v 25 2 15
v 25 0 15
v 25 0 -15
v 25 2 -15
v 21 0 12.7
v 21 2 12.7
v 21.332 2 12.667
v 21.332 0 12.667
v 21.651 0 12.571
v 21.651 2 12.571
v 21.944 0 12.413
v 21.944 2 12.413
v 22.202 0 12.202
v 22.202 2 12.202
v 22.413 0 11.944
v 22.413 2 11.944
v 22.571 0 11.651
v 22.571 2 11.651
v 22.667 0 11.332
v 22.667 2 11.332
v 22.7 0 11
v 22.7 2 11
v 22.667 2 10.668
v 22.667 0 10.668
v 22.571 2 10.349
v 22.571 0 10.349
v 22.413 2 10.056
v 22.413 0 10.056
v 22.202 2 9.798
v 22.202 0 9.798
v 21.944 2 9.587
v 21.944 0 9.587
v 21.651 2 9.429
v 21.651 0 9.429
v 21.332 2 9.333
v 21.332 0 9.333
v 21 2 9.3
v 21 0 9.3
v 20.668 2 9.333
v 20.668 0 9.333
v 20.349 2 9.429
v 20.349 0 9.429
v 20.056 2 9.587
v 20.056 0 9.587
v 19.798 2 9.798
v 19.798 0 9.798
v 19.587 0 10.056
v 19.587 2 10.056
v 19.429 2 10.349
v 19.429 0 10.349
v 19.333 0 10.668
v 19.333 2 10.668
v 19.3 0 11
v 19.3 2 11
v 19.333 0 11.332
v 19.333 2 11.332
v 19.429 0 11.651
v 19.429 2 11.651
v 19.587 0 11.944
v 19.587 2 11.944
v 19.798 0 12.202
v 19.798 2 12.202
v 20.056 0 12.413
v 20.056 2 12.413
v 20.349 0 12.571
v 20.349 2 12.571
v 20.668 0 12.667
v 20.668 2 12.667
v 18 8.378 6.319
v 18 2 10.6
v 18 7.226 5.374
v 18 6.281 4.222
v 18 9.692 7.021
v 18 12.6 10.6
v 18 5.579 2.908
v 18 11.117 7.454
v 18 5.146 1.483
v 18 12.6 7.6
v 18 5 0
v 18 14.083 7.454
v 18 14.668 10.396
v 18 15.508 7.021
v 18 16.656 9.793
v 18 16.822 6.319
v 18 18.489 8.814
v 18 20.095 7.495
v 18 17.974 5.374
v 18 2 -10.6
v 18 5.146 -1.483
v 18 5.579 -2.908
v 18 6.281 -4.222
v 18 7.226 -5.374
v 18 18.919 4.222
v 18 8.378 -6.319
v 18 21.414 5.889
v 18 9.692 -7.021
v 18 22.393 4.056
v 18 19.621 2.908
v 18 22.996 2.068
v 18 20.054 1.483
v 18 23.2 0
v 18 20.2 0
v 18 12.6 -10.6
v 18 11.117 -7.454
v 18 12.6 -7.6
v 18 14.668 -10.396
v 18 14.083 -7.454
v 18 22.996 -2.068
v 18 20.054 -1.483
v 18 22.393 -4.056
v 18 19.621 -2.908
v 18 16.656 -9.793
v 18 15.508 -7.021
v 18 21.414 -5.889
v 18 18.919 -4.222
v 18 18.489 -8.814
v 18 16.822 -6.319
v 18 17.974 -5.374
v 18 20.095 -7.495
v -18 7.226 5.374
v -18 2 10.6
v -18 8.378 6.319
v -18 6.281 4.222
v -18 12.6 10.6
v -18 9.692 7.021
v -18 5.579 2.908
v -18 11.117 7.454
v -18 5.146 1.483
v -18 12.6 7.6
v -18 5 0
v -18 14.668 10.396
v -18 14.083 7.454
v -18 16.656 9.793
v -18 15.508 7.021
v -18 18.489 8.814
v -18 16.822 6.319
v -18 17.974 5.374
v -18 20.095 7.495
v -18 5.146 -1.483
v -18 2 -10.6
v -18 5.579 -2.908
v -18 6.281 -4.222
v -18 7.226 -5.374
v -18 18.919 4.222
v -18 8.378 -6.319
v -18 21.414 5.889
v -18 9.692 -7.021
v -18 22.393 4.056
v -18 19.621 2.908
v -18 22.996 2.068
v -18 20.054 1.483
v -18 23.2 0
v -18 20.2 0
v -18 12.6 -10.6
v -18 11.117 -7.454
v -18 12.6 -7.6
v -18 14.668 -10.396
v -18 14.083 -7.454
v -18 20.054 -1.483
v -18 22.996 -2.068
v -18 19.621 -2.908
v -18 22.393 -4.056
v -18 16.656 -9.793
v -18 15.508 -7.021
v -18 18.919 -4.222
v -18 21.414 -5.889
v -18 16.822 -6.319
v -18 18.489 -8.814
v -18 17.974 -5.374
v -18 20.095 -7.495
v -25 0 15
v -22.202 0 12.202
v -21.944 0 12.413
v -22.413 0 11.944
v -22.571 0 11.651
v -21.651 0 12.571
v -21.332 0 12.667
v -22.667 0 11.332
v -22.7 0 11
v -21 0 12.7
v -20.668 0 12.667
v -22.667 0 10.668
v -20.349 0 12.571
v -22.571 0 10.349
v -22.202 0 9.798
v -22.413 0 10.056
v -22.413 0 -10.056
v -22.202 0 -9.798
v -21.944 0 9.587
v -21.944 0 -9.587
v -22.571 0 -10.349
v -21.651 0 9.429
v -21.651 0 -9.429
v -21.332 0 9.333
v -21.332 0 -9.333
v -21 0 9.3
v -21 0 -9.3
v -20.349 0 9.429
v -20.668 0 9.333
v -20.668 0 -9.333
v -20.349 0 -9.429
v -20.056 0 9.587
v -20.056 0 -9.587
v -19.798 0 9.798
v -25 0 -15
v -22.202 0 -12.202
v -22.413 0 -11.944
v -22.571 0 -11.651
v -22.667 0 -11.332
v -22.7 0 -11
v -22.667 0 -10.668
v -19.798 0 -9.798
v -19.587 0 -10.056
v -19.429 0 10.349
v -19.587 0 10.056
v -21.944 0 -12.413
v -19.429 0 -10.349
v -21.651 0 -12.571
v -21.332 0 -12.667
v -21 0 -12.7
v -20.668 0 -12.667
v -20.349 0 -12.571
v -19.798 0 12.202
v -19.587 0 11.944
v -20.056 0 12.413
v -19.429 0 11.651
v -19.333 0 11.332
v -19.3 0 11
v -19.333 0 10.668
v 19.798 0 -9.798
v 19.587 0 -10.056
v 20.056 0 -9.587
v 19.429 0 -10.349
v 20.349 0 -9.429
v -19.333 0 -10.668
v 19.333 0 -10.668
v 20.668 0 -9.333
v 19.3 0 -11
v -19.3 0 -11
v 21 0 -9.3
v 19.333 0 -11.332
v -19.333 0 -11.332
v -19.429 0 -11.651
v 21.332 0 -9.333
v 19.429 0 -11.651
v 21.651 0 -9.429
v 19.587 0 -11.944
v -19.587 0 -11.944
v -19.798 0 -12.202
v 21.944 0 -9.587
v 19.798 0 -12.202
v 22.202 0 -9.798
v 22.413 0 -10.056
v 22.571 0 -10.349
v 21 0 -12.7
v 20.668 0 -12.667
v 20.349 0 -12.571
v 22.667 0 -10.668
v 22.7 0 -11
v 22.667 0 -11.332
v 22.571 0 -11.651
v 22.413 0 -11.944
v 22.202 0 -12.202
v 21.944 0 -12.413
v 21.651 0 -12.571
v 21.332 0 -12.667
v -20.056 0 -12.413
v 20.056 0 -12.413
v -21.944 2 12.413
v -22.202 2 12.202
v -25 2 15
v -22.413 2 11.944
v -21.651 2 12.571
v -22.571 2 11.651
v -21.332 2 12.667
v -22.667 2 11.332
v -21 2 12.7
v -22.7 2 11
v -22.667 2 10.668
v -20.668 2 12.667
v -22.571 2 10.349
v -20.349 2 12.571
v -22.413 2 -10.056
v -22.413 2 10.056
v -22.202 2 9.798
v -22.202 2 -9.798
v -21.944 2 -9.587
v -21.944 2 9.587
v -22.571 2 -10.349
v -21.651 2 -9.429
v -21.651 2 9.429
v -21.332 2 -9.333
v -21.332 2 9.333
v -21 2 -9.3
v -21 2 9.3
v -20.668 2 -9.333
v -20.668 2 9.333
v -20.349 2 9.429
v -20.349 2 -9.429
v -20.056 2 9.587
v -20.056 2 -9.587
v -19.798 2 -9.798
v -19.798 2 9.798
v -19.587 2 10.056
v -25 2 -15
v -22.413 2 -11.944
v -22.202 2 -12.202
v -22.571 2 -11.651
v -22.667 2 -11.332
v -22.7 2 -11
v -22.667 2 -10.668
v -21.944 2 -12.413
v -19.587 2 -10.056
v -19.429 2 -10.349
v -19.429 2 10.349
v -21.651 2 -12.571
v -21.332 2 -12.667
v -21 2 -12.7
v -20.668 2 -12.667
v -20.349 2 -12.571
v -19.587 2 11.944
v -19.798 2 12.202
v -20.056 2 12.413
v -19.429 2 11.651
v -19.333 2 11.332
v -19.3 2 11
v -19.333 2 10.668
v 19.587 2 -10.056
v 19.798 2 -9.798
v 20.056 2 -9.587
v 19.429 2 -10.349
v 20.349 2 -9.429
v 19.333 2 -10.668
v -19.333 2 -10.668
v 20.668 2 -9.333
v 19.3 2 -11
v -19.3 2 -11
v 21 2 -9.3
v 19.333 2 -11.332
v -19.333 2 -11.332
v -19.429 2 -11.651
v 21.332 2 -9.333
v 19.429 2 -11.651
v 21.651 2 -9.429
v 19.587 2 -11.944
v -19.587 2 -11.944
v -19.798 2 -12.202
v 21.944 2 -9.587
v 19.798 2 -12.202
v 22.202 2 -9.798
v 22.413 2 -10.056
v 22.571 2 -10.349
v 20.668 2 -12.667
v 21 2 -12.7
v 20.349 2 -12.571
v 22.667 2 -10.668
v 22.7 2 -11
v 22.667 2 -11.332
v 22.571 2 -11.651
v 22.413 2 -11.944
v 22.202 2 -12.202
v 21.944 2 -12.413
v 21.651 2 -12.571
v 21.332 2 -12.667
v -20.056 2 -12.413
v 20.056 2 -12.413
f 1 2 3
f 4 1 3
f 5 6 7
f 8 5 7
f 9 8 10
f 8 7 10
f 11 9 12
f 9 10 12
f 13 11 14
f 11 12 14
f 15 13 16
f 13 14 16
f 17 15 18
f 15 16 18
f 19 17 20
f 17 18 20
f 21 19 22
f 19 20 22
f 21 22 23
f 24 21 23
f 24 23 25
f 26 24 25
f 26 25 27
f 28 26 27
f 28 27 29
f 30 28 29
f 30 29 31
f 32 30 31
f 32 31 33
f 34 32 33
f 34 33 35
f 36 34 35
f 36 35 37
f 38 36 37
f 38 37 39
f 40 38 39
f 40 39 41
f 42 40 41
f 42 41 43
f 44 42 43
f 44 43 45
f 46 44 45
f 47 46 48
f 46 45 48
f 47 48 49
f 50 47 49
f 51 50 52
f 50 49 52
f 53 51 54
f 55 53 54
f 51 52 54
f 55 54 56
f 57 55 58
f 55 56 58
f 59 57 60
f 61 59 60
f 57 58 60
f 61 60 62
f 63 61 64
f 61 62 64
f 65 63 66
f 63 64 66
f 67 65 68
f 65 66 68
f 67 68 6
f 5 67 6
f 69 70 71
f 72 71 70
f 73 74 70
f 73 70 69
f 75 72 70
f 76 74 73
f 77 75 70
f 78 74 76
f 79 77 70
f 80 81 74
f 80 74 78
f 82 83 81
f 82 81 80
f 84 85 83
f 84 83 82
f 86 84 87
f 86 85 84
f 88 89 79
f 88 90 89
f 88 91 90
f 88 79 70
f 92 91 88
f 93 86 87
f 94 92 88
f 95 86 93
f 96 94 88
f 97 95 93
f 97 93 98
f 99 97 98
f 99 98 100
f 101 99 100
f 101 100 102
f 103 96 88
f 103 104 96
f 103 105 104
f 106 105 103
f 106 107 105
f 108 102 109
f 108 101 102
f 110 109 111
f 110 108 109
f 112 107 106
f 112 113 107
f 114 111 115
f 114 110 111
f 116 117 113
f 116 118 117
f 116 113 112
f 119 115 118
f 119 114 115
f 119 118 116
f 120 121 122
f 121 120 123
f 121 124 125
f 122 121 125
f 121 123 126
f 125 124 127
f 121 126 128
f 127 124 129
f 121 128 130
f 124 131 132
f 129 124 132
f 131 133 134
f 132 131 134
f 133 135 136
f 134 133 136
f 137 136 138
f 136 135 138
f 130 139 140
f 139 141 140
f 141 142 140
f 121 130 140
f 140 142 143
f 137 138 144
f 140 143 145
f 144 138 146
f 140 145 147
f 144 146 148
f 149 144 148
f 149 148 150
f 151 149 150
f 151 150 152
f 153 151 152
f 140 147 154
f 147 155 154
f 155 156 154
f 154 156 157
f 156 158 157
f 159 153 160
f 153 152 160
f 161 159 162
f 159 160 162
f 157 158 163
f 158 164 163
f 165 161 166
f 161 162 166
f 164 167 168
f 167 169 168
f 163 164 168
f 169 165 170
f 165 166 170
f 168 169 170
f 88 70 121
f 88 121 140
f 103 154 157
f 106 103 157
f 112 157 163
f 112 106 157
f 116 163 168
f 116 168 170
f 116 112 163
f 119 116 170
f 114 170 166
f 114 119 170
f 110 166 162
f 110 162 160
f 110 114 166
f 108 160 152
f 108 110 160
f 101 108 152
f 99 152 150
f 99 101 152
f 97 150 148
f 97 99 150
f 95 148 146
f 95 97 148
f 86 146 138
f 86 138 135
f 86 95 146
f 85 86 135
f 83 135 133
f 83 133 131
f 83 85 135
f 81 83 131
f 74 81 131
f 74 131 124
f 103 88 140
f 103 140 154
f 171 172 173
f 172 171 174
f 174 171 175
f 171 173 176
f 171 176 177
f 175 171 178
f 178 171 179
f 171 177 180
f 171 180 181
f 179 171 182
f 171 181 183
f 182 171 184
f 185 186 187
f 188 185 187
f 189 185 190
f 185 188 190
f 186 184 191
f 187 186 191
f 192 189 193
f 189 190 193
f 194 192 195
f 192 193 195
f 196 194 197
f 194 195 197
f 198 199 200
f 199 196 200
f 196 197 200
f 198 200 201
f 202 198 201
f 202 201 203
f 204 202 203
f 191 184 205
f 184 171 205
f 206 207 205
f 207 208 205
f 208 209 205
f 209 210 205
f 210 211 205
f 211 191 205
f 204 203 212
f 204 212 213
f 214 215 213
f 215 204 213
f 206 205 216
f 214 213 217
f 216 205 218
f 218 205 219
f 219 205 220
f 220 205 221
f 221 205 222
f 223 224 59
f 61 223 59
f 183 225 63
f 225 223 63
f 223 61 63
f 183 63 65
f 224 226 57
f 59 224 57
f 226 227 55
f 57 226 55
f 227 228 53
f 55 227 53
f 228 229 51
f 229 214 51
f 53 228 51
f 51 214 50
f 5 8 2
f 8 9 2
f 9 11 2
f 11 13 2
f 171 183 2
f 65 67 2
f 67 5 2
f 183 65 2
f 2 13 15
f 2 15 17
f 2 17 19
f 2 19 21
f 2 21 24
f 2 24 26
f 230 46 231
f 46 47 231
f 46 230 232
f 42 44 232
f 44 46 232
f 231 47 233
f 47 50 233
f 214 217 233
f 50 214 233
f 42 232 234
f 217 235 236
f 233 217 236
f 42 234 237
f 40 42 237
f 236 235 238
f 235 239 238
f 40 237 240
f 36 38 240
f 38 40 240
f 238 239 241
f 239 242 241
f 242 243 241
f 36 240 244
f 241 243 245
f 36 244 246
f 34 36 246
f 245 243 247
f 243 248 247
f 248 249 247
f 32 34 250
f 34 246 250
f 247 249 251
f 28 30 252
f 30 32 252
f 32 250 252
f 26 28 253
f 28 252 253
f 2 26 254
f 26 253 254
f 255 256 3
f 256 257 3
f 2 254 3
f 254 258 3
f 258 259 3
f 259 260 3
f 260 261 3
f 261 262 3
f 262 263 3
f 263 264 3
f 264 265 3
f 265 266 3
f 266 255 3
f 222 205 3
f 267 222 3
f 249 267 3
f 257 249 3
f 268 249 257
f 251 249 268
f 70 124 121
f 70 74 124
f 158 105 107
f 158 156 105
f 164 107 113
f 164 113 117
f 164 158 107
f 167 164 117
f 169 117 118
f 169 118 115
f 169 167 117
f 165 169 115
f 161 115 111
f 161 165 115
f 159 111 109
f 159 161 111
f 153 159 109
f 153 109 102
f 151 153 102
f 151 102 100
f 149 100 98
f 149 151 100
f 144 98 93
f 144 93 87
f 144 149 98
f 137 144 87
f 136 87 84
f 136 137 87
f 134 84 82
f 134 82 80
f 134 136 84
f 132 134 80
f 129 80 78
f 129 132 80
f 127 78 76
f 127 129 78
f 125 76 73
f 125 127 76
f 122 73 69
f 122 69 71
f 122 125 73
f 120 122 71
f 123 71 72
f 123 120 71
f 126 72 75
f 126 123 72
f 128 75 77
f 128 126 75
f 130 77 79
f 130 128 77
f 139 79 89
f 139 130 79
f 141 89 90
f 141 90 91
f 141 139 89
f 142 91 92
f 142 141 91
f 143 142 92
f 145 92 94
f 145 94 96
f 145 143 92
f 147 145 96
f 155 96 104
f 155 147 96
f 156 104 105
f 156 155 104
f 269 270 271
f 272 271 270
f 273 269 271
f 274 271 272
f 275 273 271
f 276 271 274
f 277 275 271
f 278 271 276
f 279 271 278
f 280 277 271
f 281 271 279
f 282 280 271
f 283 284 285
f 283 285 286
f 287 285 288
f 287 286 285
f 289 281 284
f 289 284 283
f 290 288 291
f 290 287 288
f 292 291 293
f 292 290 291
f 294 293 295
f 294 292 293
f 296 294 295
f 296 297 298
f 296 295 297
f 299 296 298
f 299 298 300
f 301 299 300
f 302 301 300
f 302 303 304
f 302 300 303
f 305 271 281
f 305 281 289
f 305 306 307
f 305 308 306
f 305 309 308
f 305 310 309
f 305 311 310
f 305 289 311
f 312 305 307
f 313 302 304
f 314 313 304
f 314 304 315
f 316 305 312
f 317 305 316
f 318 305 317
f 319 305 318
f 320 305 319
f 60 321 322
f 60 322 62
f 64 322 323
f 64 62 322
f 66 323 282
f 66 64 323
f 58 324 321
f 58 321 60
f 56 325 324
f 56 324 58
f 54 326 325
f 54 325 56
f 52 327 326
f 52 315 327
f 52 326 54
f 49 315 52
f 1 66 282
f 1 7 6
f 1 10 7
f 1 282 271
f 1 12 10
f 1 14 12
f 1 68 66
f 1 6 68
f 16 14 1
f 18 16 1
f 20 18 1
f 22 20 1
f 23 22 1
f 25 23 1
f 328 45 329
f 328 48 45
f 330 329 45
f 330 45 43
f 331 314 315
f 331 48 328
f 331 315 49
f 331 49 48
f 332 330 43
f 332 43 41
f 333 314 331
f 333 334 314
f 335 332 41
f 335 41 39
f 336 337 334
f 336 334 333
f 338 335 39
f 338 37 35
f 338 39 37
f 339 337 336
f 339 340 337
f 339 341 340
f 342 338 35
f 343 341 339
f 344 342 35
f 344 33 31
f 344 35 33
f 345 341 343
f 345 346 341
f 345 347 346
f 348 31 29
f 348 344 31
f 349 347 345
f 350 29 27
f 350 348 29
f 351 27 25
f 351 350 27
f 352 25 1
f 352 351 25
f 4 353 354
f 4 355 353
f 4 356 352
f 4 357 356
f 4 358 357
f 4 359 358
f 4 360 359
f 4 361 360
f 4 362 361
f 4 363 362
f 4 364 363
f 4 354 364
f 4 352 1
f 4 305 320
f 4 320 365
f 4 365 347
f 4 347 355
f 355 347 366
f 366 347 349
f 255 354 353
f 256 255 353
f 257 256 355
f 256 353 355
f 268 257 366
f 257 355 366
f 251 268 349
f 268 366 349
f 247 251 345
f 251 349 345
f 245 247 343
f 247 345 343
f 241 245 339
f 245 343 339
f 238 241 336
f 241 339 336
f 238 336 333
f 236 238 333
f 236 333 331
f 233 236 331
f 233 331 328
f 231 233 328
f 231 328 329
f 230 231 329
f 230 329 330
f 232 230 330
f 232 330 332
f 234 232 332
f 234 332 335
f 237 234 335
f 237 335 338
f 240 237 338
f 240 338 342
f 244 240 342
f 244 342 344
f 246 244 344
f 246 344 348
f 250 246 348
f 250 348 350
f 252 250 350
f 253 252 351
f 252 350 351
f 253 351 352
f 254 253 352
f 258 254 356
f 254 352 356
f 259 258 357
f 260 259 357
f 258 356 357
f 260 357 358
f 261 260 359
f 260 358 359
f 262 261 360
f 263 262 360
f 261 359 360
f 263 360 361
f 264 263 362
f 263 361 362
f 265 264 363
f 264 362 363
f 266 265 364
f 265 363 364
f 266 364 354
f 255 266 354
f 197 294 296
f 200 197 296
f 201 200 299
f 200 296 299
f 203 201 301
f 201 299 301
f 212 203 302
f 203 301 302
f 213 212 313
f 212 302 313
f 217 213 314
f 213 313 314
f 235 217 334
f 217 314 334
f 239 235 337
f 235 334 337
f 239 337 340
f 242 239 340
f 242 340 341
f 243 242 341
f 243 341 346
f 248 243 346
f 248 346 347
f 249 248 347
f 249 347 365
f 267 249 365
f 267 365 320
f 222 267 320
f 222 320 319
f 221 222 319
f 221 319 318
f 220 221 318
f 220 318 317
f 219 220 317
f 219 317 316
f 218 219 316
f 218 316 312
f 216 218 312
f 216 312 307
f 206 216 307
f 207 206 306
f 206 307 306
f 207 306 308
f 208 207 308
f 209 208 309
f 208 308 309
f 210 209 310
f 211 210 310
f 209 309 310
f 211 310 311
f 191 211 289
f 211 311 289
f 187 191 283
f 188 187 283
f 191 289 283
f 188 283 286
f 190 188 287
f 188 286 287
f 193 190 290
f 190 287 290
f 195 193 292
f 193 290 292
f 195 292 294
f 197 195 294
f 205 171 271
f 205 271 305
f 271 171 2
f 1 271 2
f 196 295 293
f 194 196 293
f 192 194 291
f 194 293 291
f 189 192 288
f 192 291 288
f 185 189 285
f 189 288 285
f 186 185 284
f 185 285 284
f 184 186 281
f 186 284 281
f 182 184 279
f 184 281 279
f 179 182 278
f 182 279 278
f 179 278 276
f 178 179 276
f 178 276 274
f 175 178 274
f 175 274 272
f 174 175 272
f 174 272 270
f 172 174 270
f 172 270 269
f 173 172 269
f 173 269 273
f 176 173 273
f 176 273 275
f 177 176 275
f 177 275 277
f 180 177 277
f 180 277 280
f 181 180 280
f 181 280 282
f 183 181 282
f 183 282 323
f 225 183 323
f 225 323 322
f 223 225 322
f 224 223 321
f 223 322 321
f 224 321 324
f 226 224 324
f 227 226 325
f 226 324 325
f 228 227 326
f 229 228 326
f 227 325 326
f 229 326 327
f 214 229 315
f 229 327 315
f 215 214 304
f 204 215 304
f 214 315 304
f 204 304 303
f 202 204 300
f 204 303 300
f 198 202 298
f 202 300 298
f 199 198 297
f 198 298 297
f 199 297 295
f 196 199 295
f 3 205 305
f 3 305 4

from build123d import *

# Parameters (mm, degrees)
SCHIZZO1_W                   = 50
SCHIZZO1_H                   = 30
ESTRUSIONE_ESTRUSIONE1_DEPTH = 2
SCHIZZO2_R                   = 7.6
ESTRUSIONE_ESTRUSIONE2_DEPTH = 18
SCHIZZO3_R                   = 1.7
TAGLIO_ESTRUSIONE1_DEPTH     = 37.047746115


with BuildPart() as part:
    # Schizzo1 → Estrusione-Estrusione1 (new body)
    with BuildSketch(Plane(origin=(0, 0, 0), x_dir=(1, 0, 0), z_dir=(0, 1, 0))):
        Rectangle(SCHIZZO1_W, SCHIZZO1_H)
    extrude(amount=ESTRUSIONE_ESTRUSIONE1_DEPTH)

    # Schizzo3 → Taglio-Estrusione1 (cut, through all)
    with BuildSketch(Plane(origin=(0, 2, 0), x_dir=(1, 0, 0), z_dir=(0, 1, 0))):
        with Locations(Location((-21, 11, 0), (0, 0, 270))):
            Circle(SCHIZZO3_R)
        with Locations(Location((21, 11, 0), (0, 0, 90))):
            Circle(SCHIZZO3_R)
        with Locations(Location((-21, -11, 0), (0, 0, 90))):
            Circle(SCHIZZO3_R)
        with Locations(Location((21, -11, 0), (0, 0, 270))):
            Circle(SCHIZZO3_R)
    extrude(amount=-TAGLIO_ESTRUSIONE1_DEPTH, mode=Mode.SUBTRACT)


with BuildPart() as body_2:
    # Schizzo2 → Estrusione-Estrusione2 (new, symmetric)
    with BuildSketch(Plane(origin=(0, 0, 0), x_dir=(0, 0, -1), z_dir=(1, 0, 0))):
        with BuildLine():
            Line((-10.6, 12.6), (-10.6, 2))
            Line((-10.6, 2), (10.6, 2))
            Line((10.6, 2), (10.6, 12.6))
            ThreePointArc((10.6, 12.6), (0, 23.2), (-10.6, 12.6))
        make_face()
        with Locations((0, 12.6)):
            Circle(SCHIZZO2_R, mode=Mode.SUBTRACT)
    extrude(amount=ESTRUSIONE_ESTRUSIONE2_DEPTH, both=True)


solid = Compound([part.part, body_2.part])
